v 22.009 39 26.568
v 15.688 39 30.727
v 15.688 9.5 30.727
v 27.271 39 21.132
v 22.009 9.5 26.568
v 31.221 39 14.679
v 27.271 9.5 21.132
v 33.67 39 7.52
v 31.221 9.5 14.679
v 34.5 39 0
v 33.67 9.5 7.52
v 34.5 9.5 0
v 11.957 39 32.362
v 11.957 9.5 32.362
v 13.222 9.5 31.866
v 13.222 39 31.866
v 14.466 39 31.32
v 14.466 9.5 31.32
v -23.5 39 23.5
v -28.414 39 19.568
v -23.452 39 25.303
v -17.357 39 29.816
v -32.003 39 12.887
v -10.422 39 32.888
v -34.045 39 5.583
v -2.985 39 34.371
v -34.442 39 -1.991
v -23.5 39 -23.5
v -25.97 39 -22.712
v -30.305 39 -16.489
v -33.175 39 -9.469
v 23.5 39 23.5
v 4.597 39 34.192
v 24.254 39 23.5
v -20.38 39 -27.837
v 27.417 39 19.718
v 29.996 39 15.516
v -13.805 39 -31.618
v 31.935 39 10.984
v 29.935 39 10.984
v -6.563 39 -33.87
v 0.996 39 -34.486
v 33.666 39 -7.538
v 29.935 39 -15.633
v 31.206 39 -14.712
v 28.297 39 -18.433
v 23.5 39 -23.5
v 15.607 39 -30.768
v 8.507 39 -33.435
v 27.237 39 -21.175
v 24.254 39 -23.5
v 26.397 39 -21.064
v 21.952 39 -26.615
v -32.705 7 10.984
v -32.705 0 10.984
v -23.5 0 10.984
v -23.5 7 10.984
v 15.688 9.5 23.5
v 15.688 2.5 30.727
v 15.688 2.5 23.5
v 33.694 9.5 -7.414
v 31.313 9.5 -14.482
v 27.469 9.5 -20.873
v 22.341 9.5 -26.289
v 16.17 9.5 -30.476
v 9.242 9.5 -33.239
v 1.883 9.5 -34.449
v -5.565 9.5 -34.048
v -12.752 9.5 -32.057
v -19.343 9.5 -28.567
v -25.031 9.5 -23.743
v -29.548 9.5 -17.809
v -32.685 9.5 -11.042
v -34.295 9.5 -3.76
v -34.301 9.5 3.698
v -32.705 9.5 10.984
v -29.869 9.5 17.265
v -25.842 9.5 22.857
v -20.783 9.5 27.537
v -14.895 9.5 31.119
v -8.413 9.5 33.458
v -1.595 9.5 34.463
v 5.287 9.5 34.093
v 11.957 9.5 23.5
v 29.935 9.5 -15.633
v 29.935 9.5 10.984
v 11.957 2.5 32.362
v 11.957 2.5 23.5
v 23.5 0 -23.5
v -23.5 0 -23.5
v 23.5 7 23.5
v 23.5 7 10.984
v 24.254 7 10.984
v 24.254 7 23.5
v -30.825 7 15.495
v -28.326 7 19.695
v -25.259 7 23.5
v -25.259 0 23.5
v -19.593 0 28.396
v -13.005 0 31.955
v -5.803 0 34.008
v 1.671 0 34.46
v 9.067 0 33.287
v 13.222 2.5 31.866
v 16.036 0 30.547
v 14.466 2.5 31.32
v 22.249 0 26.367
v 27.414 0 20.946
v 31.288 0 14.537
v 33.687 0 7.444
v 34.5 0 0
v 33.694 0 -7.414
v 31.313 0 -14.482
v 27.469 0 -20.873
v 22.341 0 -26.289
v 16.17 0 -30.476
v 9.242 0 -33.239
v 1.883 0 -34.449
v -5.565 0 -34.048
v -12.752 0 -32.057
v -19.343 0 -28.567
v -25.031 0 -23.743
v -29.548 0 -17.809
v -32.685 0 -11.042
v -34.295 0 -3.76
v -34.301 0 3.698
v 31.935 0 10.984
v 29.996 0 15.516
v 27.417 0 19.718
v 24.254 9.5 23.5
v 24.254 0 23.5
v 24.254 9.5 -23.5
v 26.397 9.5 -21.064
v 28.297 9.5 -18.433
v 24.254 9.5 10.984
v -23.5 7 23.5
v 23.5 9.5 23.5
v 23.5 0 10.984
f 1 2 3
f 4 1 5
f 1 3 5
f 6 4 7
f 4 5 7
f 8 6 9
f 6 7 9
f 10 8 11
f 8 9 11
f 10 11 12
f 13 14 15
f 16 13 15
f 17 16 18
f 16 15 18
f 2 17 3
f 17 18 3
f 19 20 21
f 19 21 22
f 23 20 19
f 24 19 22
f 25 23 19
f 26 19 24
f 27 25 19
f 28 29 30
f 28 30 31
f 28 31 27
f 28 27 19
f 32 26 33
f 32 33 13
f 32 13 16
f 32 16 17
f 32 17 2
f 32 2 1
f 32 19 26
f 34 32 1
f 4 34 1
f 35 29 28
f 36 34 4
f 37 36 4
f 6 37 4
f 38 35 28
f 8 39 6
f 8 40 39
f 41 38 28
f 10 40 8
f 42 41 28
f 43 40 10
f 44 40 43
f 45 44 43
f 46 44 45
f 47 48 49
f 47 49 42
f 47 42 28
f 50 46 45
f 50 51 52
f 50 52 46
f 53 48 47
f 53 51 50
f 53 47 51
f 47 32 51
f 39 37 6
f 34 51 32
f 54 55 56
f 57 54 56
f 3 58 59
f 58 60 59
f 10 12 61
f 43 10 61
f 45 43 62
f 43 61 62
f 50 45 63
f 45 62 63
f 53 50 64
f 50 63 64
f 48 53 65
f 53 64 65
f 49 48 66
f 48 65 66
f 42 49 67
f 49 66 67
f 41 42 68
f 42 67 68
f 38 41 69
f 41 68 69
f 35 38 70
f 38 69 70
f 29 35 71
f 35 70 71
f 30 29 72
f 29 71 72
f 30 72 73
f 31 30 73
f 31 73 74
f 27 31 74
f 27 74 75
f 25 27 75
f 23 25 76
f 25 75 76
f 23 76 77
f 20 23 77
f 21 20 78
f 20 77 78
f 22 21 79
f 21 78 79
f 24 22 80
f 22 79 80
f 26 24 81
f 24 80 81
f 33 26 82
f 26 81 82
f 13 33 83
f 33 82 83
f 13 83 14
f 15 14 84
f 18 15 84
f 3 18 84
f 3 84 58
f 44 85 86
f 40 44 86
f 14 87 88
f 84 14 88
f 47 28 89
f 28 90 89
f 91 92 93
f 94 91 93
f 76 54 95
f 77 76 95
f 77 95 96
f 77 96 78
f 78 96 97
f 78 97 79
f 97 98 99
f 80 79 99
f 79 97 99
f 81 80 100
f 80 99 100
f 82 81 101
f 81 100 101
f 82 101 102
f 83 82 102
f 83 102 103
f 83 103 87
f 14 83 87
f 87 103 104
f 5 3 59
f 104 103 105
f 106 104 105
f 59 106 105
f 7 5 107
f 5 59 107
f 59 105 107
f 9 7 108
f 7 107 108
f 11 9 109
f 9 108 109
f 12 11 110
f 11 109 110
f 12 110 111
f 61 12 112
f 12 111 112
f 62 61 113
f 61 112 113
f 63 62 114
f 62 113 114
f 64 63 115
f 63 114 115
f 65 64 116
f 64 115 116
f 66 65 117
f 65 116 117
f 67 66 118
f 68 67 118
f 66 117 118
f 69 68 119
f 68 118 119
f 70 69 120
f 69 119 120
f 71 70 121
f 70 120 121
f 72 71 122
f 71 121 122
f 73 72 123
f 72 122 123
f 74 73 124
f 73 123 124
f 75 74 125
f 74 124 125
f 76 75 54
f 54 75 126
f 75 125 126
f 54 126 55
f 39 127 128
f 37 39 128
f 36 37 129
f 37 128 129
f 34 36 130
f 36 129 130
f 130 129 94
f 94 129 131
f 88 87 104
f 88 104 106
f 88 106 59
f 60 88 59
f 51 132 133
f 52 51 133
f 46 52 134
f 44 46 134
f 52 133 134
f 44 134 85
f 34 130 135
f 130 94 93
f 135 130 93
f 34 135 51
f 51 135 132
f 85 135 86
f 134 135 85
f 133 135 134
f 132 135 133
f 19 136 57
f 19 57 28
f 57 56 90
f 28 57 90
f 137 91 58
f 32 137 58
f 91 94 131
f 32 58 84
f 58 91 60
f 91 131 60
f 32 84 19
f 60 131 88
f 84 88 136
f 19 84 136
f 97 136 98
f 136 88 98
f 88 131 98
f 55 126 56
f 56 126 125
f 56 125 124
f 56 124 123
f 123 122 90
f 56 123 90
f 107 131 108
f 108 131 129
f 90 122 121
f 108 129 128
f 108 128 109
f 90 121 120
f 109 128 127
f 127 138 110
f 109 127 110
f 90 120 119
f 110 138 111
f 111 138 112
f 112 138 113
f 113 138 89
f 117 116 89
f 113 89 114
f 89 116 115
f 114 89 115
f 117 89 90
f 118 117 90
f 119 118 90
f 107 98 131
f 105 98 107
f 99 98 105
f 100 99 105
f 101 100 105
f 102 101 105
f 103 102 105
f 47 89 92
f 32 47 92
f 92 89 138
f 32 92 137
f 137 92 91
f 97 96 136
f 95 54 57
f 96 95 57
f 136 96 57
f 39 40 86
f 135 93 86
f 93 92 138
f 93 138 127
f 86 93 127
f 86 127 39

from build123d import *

# Parameters (mm, degrees)
BOSS_EXTRUDE1_DEPTH = 2.5
BOSS_EXTRUDE2_DEPTH = 4.5
SKETCH3_W           = 0.753987371
SKETCH3_H           = 12.516496397
BOSS_EXTRUDE3_DEPTH = 2.5
BOSS_EXTRUDE4_DEPTH = 29.5


with BuildPart() as part:
    # Sketch1 → Boss-Extrude1 (new body)
    with BuildSketch(Plane(origin=(0, 0, 0), x_dir=(1, 0, 0), z_dir=(0, 1, 0))):
        with BuildLine():
            Line((23.5, -23.5), (-23.5, -23.5))
            Line((-23.5, -23.5), (-25.258661881, -23.5))
            ThreePointArc((-25.258661881, -23.5), (12.625889377, -32.106649116), (34.5, 0))
            ThreePointArc((34.5, 0), (-5.56461177, 34.04827596), (-32.704933093, -10.983503603))
            Line((-32.704933093, -10.983503603), (-23.5, -10.983503603))
            Line((-23.5, -10.983503603), (-23.5, 23.5))
            Line((-23.5, 23.5), (23.5, 23.5))
            Line((23.5, 23.5), (23.5, -10.983503603))
            Line((23.5, -10.983503603), (31.93538088, -10.983503603))
            ThreePointArc((31.93538088, -10.983503603), (28.783275467, -17.66434139), (24.253987371, -23.5))
            Line((24.253987371, -23.5), (23.5, -23.5))
        make_face()
    extrude(amount=BOSS_EXTRUDE1_DEPTH)

    # Sketch2 → Boss-Extrude2 (add)
    with BuildSketch(Plane(origin=(0, 2.5, 0), x_dir=(1, 0, 0), z_dir=(0, 1, 0))):
        with BuildLine():
            Line((23.5, 23.5), (23.5, -10.983503603))
            Line((23.5, -10.983503603), (31.93538088, -10.983503603))
            ThreePointArc((31.93538088, -10.983503603), (28.783275467, -17.66434139), (24.253987371, -23.5))
            Line((24.253987371, -23.5), (15.688360219, -23.5))
            Line((15.688360219, -23.5), (15.688360219, -30.726622881))
            ThreePointArc((15.688360219, -30.726622881), (13.032214999, 31.943878478), (-32.704933093, -10.983503603))
            Line((-32.704933093, -10.983503603), (-23.5, -10.983503603))
            Line((-23.5, -10.983503603), (-23.5, 23.5))
            Line((-23.5, 23.5), (23.5, 23.5))
        make_face()
        with BuildLine():
            Line((11.957302625, -23.5), (-25.258661881, -23.5))
            ThreePointArc((-25.258661881, -23.5), (-7.991464927, -33.561681846), (11.957302625, -32.361596282))
            Line((11.957302625, -32.361596282), (11.957302625, -23.5))
        make_face()
    extrude(amount=BOSS_EXTRUDE2_DEPTH)

    # Sketch3 → Boss-Extrude3 (add)
    with BuildSketch(Plane(origin=(0, 7, 0), x_dir=(1, 0, 0), z_dir=(0, 1, 0))):
        with BuildLine():
            Line((-23.5, -23.5), (-23.5, -10.983503603))
            Line((-23.5, -10.983503603), (-32.704933093, -10.983503603))
            ThreePointArc((-32.704933093, -10.983503603), (-14.895360155, -31.118776419), (11.957302625, -32.361596282))
            Line((11.957302625, -32.361596282), (11.957302625, -23.5))
            Line((11.957302625, -23.5), (-23.5, -23.5))
        make_face()
        with Locations((23.876993686, -17.241751802)):
            Rectangle(SKETCH3_W, SKETCH3_H)
        with BuildLine():
            ThreePointArc((31.93538088, -10.983503603), (28.783275467, -17.66434139), (24.253987371, -23.5))
            Line((24.253987371, -23.5), (15.688360219, -23.5))
            Line((15.688360219, -23.5), (15.688360219, -30.726622881))
            ThreePointArc((15.688360219, -30.726622881), (13.032214999, 31.943878478), (-32.704933093, -10.983503603))
            Line((-32.704933093, -10.983503603), (-23.5, -10.983503603))
            Line((-23.5, -10.983503603), (-23.5, 23.5))
            Line((-23.5, 23.5), (23.5, 23.5))
            Line((23.5, 23.5), (23.5, -10.983503603))
            Line((23.5, -10.983503603), (31.93538088, -10.983503603))
        make_face()
    extrude(amount=BOSS_EXTRUDE3_DEPTH)

    # Sketch4 → Boss-Extrude4 (add)
    # profile 1 of 2: a face of its own
    with BuildSketch(Plane(origin=(0, 9.5, 0), x_dir=(1, 0, 0), z_dir=(0, 1, 0))):
        with BuildLine():
            Line((11.957302625, -23.5), (-23.5, -23.5))
            Line((-23.5, -23.5), (-23.5, 23.5))
            Line((-23.5, 23.5), (23.5, 23.5))
            Line((23.5, 23.5), (23.5, -23.5))
            Line((23.5, -23.5), (15.688360219, -23.5))
            Line((15.688360219, -23.5), (15.688360219, -30.726622881))
            ThreePointArc((15.688360219, -30.726622881), (29.423616599, -18.013905357), (34.5, 0))
            ThreePointArc((34.5, 0), (-28.308805525, 19.71957225), (11.957302625, -32.361596282))
            Line((11.957302625, -32.361596282), (11.957302625, -23.5))
        make_face()
        with BuildLine():
            ThreePointArc((31.93538088, -10.983503603), (28.783275467, -17.66434139), (24.253987371, -23.5))
            Line((24.253987371, -23.5), (24.253987371, -10.983503603))
            Line((24.253987371, -10.983503603), (24.253987371, 23.5))
            ThreePointArc((24.253987371, 23.5), (27.378747533, 19.771446252), (29.93538088, 15.632622139))
            Line((29.93538088, 15.632622139), (29.93538088, -10.983503603))
            Line((29.93538088, -10.983503603), (31.93538088, -10.983503603))
        make_face(mode=Mode.SUBTRACT)
    # profile 2 of 2: a face of its own
    with BuildSketch(Plane(origin=(0, 9.5, 0), x_dir=(1, 0, 0), z_dir=(0, 1, 0))):
        with BuildLine():
            Line((15.688360219, -23.5), (11.957302625, -23.5))
            Line((11.957302625, -23.5), (11.957302625, -32.361596282))
            ThreePointArc((11.957302625, -32.361596282), (13.846983535, -31.599225417), (15.688360219, -30.726622881))
            Line((15.688360219, -30.726622881), (15.688360219, -23.5))
        make_face()
    extrude(amount=BOSS_EXTRUDE4_DEPTH)


solid = part.part
